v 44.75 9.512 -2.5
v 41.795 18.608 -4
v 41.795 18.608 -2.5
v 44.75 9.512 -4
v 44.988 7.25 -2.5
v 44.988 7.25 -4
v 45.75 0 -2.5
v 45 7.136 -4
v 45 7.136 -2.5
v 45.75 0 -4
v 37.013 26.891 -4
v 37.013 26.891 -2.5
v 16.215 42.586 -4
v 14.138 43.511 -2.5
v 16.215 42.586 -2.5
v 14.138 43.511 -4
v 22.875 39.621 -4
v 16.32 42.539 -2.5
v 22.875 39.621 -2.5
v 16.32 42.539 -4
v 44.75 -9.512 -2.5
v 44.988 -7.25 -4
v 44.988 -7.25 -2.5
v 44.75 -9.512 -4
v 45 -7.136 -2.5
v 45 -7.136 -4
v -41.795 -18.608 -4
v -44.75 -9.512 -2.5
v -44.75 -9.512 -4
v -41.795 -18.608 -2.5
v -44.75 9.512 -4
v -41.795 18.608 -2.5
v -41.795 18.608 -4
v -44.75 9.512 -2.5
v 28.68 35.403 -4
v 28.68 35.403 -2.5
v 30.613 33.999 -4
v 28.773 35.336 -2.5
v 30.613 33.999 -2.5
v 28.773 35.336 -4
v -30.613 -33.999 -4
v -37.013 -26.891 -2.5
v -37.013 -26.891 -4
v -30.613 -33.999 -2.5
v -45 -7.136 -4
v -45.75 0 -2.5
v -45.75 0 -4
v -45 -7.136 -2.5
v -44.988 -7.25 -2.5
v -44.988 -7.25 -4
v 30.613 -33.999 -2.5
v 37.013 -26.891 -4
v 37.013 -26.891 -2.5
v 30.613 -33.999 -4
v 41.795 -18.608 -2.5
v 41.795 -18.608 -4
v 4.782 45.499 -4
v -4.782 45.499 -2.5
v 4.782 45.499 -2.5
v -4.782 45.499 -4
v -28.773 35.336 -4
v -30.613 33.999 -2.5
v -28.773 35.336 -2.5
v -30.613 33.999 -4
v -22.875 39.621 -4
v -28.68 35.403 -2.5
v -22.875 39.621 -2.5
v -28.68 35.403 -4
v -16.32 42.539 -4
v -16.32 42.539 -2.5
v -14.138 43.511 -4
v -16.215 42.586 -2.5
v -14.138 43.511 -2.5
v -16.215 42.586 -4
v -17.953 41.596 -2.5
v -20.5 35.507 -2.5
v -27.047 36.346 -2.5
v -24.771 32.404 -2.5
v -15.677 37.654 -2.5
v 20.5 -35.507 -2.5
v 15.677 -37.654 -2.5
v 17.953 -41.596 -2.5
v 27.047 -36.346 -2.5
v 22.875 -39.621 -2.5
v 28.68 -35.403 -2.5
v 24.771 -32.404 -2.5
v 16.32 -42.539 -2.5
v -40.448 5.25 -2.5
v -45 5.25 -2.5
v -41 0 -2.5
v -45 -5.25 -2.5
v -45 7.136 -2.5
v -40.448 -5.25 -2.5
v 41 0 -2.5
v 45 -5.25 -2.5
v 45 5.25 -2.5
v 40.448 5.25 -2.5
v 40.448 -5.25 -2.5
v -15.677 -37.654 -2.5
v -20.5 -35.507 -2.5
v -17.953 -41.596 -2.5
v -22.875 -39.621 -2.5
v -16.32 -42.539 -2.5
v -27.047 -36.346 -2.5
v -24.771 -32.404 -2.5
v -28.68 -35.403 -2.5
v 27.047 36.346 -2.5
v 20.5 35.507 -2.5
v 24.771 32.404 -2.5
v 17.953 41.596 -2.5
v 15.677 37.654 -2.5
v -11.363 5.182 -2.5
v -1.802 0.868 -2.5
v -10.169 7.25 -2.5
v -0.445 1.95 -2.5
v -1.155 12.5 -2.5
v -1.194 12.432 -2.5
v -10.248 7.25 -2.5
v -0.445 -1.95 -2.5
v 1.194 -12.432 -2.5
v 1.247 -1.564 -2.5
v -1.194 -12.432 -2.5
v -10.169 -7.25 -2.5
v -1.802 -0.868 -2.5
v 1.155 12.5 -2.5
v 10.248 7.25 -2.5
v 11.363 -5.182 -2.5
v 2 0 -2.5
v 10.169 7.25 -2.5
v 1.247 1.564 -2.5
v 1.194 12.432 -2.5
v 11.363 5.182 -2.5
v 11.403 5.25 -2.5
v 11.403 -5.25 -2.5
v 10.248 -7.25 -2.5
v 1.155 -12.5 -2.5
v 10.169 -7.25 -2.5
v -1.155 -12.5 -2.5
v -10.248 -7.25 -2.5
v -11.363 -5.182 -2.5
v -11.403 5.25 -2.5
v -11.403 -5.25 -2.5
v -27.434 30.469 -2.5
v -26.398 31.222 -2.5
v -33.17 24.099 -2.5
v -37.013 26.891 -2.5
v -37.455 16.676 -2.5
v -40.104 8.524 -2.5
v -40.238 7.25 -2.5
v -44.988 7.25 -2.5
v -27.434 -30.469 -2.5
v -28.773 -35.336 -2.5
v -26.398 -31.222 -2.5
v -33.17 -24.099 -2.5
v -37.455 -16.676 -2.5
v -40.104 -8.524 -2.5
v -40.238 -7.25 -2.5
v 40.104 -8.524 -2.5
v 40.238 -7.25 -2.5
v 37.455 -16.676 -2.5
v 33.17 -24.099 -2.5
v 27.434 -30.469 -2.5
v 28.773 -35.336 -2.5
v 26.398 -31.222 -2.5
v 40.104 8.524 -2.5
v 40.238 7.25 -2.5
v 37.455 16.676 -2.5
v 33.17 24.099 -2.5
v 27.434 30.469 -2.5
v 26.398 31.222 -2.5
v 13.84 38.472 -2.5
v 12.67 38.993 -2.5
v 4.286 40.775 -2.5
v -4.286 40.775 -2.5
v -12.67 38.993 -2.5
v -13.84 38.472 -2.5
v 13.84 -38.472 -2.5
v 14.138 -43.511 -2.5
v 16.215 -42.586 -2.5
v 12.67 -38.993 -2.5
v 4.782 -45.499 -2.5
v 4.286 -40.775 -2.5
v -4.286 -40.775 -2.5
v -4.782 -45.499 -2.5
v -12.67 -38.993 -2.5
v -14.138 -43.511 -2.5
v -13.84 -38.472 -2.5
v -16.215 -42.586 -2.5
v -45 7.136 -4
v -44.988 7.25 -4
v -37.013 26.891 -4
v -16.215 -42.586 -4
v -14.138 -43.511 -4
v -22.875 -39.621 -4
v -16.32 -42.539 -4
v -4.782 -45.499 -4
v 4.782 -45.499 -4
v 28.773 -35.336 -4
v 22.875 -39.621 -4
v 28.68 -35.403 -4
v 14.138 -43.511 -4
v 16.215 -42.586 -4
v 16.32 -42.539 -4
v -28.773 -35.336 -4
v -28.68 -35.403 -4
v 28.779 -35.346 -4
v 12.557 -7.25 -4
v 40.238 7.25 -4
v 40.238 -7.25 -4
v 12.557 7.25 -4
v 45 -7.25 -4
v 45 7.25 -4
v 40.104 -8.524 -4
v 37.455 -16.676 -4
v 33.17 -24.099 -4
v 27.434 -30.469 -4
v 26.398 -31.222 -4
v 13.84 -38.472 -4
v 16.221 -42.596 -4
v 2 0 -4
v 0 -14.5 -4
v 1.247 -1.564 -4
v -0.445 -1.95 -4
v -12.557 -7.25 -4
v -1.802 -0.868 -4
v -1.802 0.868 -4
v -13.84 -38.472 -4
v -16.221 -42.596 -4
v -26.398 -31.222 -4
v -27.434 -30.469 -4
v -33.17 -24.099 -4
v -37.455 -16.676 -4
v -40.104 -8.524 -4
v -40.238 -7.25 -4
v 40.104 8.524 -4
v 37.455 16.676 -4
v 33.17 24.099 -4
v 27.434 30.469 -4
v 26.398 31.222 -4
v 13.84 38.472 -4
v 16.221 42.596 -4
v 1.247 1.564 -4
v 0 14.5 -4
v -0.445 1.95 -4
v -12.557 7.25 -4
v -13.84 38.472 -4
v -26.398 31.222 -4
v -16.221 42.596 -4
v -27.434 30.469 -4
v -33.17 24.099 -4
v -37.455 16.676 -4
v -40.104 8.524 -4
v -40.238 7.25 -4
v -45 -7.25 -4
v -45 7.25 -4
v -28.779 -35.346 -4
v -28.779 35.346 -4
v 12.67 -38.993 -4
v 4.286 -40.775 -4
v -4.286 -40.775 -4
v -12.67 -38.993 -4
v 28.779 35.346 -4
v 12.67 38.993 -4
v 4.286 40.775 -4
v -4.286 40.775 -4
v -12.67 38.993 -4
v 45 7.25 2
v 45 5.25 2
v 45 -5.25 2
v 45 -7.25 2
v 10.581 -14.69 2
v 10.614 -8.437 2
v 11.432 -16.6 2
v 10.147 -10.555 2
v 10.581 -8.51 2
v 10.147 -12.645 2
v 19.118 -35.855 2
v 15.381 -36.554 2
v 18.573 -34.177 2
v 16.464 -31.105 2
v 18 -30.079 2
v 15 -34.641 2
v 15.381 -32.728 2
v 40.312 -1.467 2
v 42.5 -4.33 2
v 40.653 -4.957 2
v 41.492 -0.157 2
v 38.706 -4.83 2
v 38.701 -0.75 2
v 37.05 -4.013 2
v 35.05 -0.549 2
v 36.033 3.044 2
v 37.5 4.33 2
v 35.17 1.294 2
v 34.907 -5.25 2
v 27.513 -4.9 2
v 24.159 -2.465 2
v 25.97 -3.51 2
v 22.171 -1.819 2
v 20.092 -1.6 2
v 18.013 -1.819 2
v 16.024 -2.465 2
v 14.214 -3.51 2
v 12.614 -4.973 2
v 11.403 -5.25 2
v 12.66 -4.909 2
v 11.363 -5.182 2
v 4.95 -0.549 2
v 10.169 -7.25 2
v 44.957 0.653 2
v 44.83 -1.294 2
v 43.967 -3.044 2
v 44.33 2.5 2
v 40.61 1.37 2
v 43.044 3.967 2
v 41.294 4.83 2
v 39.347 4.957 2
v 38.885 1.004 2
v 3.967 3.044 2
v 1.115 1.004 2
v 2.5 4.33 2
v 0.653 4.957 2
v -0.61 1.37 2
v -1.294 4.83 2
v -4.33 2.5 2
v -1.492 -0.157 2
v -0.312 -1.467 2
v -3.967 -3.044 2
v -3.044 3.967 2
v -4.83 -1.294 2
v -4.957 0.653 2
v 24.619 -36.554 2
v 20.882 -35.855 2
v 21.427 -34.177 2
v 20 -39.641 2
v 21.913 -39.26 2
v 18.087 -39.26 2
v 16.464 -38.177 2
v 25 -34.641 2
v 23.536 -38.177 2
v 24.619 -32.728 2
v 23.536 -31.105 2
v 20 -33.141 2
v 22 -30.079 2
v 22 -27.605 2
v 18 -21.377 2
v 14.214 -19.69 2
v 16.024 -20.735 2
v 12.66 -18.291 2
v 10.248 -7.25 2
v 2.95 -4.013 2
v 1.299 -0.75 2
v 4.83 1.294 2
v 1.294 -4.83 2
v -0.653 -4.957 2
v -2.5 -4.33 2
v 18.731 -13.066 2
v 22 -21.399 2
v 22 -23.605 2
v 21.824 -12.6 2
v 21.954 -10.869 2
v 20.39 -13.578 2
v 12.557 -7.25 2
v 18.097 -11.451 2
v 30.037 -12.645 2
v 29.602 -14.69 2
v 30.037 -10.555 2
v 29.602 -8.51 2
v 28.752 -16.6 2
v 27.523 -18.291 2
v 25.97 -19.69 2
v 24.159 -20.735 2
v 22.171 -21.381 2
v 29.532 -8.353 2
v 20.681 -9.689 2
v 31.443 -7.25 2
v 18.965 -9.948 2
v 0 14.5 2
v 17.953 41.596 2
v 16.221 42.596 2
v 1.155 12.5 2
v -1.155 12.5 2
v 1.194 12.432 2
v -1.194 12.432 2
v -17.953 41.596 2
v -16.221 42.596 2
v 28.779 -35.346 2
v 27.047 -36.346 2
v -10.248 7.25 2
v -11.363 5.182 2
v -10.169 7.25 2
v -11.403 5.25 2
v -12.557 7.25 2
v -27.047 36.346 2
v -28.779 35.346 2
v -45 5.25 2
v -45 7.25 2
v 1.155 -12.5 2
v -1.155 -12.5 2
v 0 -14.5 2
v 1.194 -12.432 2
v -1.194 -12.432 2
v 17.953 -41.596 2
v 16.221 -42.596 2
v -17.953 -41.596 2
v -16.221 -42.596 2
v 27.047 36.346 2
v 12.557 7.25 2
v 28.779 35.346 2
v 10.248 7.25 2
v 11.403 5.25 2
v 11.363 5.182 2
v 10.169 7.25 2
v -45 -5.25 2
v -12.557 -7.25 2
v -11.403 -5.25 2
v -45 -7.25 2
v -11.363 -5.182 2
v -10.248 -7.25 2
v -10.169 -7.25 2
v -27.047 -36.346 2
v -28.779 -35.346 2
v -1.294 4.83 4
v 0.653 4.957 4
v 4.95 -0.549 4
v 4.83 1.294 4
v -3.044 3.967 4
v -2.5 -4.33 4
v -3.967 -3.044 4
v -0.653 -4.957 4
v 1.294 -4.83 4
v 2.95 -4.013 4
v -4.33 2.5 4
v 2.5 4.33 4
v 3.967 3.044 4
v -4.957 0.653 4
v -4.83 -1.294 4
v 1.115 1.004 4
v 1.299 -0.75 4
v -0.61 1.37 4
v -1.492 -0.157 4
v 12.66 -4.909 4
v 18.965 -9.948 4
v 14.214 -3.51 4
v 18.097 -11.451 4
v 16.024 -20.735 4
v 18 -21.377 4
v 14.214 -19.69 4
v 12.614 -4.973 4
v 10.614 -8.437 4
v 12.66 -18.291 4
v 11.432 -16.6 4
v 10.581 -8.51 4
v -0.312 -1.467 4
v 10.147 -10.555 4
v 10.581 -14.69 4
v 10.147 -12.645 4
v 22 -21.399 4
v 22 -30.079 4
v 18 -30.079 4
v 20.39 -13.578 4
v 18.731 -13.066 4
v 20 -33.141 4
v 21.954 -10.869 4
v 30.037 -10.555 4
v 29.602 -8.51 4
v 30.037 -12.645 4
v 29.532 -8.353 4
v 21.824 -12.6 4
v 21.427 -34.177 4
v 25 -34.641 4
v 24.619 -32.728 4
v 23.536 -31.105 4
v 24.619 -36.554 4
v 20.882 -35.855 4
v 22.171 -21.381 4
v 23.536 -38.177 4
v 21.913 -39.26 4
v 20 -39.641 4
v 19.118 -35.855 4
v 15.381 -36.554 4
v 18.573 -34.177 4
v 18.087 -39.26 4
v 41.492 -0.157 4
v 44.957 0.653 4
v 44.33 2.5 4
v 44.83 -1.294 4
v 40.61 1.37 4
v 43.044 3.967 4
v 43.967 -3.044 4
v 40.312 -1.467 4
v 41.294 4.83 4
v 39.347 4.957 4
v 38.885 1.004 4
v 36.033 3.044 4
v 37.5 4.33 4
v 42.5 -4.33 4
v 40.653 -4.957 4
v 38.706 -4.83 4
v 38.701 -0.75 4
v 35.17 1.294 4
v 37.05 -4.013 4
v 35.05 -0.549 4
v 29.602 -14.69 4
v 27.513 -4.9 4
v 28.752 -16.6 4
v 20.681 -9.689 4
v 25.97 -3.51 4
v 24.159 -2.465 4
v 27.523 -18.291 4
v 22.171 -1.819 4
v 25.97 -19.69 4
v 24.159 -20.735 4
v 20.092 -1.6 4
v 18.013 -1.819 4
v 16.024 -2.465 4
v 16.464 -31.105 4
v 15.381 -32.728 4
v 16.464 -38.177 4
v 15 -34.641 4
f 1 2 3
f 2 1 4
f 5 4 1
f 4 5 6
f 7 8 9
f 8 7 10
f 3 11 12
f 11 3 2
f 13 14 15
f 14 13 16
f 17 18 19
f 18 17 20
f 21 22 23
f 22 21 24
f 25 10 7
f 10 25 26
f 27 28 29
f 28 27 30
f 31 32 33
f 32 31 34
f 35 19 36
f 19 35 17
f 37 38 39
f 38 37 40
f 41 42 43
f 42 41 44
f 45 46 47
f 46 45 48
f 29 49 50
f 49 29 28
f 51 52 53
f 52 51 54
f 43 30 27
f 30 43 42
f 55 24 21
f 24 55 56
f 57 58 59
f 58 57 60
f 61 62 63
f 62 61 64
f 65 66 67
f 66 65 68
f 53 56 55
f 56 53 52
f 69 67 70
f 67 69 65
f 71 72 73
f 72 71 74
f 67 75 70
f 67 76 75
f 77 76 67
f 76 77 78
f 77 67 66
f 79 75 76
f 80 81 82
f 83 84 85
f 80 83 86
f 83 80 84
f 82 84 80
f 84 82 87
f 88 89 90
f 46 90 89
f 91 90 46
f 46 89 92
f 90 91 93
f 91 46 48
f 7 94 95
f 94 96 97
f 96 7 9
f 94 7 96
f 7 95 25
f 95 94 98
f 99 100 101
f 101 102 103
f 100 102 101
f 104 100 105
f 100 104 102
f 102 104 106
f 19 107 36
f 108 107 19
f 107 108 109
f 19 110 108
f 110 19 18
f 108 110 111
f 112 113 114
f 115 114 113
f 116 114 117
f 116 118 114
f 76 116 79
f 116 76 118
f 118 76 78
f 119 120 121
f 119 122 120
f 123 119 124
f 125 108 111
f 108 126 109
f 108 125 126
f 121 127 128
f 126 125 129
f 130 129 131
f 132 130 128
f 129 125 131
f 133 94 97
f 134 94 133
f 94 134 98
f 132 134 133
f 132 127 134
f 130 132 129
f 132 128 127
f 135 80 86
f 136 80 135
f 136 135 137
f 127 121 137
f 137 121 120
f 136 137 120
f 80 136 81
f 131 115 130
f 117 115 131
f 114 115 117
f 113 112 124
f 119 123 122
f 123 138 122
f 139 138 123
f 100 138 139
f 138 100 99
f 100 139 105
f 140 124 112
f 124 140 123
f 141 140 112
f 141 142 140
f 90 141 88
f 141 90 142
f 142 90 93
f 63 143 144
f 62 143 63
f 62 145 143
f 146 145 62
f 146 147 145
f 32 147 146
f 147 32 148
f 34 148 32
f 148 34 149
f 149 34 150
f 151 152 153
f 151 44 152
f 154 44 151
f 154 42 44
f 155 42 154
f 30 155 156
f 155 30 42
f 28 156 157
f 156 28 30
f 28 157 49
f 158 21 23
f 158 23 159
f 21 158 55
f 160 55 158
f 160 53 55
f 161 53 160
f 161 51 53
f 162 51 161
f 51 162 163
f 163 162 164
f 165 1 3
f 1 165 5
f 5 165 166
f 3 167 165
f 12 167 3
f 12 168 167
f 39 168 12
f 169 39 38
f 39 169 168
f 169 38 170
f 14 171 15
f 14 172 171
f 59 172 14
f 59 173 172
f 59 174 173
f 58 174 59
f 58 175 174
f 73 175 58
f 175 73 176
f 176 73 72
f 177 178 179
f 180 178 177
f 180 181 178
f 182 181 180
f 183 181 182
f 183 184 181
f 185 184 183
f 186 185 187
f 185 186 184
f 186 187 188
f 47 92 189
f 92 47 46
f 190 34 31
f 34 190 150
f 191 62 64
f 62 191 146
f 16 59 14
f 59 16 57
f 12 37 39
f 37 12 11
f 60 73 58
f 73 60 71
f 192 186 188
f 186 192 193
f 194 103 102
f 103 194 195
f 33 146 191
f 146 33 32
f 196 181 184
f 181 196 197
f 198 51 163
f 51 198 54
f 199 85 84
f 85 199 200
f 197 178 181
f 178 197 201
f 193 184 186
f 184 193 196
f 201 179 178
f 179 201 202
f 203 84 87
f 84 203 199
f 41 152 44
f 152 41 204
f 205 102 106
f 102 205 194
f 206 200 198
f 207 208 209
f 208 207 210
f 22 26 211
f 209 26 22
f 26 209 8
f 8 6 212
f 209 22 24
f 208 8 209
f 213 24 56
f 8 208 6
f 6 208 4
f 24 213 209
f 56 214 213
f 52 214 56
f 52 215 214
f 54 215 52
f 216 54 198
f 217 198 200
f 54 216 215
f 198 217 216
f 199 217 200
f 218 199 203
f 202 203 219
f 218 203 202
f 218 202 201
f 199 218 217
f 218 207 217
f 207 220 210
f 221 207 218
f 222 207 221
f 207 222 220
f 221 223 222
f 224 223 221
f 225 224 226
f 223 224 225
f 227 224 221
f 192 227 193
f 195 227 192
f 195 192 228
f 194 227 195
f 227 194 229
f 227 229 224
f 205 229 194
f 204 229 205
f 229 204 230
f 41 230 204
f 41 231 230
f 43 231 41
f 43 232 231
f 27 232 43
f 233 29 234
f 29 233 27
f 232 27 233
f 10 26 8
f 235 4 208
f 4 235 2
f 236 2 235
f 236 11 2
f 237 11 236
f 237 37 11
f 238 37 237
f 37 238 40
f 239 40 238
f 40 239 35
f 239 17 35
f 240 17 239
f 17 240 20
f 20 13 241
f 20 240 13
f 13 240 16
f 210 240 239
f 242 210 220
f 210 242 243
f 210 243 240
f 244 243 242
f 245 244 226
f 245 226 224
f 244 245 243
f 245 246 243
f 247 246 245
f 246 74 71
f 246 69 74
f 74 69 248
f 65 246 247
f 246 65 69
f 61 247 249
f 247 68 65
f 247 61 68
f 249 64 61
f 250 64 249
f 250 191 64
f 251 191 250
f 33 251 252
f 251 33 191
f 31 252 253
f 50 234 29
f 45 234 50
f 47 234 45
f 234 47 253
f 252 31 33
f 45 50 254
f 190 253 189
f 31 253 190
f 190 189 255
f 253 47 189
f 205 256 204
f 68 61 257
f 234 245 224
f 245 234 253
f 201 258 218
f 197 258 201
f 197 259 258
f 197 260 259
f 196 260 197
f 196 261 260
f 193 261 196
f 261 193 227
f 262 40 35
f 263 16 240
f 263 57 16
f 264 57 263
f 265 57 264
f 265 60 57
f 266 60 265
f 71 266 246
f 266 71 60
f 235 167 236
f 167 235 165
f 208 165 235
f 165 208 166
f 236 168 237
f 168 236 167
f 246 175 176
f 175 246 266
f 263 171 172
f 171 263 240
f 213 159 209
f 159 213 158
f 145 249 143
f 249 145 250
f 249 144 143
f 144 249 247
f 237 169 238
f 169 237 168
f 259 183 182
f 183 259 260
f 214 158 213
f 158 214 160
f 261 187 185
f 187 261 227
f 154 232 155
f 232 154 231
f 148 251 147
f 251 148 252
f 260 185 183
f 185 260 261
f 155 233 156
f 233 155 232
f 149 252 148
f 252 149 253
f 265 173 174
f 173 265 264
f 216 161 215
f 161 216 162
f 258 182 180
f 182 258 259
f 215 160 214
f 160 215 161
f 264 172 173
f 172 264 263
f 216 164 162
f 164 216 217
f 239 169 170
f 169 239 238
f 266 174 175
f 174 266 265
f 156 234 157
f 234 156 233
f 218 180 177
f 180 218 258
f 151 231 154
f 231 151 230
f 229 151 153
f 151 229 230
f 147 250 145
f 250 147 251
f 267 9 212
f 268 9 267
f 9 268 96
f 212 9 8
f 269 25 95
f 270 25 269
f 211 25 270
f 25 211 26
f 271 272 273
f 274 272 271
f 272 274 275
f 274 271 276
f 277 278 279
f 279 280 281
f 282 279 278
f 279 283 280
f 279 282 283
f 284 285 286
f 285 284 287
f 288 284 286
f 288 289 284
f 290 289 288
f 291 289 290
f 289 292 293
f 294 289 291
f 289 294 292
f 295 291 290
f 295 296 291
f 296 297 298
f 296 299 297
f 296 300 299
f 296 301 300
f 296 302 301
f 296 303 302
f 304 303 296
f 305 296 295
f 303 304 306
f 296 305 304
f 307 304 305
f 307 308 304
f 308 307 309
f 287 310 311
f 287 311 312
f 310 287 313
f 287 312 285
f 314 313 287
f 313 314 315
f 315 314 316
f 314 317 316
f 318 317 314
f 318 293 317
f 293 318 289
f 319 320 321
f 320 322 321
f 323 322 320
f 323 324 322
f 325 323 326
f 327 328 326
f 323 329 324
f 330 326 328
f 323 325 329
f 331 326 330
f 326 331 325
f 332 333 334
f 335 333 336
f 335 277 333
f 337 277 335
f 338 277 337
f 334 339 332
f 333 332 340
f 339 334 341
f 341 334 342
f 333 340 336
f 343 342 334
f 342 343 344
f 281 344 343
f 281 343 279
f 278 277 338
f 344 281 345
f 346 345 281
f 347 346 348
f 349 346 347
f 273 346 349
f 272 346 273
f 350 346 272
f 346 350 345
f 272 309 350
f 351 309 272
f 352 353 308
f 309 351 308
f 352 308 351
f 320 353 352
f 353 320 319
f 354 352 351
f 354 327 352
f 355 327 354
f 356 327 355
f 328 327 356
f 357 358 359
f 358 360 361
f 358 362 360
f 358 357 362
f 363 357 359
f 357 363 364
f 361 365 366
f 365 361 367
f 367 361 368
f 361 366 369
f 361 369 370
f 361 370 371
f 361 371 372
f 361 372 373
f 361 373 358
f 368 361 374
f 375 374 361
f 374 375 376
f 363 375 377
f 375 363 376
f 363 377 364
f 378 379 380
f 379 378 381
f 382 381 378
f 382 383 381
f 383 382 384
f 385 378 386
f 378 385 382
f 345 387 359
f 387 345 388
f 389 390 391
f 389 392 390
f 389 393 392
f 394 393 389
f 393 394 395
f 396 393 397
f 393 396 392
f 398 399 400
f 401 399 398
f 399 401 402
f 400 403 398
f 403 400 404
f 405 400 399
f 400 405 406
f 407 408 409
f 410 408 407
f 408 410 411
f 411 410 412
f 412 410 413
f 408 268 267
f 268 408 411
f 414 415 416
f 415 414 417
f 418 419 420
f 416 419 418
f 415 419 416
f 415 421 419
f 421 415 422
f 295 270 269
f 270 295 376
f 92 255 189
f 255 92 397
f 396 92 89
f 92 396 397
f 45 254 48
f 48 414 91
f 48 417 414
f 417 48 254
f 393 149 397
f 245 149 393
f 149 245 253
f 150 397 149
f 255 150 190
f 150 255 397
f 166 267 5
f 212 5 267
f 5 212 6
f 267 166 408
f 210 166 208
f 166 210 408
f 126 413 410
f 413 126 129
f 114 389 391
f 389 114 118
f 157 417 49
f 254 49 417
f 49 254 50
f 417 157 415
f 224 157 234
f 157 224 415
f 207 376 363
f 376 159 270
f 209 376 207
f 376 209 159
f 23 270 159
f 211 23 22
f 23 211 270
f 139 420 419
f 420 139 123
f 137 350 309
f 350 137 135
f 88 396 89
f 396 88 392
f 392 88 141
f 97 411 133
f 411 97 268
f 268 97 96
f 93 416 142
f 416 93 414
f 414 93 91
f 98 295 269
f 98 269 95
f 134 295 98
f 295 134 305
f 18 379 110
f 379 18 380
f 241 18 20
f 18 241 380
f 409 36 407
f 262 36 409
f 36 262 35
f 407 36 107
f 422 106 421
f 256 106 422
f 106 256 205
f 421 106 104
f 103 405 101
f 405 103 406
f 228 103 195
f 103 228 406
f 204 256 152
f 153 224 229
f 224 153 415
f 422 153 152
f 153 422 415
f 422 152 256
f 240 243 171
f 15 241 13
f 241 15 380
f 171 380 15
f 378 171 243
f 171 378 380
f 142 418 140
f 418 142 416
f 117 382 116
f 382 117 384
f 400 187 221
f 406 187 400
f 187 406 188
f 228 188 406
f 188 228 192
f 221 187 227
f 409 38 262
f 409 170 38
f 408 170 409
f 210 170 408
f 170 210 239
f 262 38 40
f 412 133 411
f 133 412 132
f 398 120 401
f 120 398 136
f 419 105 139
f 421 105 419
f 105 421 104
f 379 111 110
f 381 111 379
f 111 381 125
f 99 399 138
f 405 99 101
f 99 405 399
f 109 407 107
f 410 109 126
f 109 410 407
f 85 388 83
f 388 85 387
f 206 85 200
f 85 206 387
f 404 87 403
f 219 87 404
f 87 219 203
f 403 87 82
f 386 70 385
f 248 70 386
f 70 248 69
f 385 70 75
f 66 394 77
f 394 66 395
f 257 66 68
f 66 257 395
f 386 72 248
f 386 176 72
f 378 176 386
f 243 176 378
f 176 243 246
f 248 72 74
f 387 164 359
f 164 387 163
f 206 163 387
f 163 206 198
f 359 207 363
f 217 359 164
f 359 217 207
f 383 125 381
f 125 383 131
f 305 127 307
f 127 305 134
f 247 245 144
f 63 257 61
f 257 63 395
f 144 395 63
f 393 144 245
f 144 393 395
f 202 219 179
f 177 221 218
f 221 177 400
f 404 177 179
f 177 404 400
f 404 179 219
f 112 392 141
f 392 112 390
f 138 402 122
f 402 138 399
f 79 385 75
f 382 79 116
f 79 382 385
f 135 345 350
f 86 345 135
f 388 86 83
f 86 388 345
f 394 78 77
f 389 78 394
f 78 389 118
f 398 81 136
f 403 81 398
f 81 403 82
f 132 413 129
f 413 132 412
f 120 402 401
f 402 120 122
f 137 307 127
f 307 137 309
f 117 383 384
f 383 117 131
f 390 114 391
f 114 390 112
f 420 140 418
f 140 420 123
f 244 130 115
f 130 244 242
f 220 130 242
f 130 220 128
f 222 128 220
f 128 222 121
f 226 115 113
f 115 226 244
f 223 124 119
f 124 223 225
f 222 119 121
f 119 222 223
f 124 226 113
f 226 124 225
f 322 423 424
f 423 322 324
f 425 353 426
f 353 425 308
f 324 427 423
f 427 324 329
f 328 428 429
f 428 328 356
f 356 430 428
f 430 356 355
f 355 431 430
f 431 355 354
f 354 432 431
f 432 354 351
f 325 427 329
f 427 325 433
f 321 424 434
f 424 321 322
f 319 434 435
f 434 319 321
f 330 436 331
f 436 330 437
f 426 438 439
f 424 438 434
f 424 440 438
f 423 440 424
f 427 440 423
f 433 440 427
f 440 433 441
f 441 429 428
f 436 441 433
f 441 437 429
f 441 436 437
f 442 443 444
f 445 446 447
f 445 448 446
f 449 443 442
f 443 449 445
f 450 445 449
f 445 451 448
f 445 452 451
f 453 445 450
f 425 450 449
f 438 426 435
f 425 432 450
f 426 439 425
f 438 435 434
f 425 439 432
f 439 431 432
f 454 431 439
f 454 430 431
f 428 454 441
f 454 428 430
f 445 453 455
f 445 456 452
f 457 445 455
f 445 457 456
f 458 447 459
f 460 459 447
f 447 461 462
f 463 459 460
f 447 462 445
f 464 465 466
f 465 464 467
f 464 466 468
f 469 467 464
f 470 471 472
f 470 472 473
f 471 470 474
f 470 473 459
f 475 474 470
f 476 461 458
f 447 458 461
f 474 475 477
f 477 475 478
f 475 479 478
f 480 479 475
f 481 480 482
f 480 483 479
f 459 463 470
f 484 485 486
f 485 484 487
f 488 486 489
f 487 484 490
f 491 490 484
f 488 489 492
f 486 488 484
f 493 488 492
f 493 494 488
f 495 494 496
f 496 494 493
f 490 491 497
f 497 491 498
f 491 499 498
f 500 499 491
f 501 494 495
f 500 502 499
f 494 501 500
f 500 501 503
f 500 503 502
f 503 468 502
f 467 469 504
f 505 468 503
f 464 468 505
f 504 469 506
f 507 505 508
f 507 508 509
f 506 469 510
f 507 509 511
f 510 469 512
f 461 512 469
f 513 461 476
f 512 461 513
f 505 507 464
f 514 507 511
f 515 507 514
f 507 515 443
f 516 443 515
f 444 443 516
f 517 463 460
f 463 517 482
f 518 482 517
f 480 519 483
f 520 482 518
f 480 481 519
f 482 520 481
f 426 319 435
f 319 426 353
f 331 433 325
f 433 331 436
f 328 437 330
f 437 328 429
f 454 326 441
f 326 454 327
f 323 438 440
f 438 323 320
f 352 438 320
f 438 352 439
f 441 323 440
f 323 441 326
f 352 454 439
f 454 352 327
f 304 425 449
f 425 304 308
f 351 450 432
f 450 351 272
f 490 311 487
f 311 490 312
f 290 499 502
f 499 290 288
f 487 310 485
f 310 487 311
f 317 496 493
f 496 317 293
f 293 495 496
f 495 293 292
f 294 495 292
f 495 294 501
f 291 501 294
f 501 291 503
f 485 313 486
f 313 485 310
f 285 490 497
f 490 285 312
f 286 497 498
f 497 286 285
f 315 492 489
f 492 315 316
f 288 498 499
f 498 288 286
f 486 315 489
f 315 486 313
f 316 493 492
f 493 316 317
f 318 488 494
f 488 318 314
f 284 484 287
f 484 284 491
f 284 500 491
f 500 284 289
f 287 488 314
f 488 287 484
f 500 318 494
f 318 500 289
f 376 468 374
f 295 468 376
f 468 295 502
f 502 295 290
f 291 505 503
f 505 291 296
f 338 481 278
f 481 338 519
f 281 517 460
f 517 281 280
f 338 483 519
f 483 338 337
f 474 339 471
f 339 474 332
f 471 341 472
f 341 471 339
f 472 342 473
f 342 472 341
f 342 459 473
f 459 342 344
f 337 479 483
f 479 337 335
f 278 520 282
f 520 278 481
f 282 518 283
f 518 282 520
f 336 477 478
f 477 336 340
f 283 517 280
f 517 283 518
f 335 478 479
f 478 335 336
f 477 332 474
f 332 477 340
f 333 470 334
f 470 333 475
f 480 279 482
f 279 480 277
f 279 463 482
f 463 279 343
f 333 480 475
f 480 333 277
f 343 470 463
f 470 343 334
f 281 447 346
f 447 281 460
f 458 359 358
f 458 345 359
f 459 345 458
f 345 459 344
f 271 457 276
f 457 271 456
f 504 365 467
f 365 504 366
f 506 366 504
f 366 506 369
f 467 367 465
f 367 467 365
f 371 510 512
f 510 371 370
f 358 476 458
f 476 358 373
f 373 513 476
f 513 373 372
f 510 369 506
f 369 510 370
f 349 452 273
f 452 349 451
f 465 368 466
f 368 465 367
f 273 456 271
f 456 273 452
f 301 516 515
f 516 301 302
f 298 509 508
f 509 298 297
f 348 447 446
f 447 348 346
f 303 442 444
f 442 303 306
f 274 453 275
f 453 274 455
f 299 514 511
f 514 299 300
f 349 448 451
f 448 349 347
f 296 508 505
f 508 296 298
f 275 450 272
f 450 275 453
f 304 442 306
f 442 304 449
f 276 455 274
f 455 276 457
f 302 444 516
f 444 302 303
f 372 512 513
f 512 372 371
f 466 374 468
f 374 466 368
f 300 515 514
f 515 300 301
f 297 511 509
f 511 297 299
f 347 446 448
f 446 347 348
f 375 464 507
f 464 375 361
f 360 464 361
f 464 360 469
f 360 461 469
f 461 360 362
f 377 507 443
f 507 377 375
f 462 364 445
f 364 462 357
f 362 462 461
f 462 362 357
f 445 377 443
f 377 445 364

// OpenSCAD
/* 
* Parameters
*/
bearing_diameter = 10;
bearing_bore_diameter = 3;
bearing_height = 4;
wheel_diameter = 90;
wheel_bore_diameter = 3;
wheel_height = 10;
frame_thickness = 2;


/* 
* Assembly / Printing
*/
wheel();
small_wheel();
// for print use rotate
//translate([0, 0, 54]) rotate([0, 90, 0]) rotate([0, 0, 30])
//frame();


/* 
* Modules
*/
module frame(){
	a = wheel_diameter/2 + 15;
	b = wheel_diameter/4 + 20;

	translate([0,0,-6]){
		difference(){
			union(){
				cylinder(r=wheel_bore_diameter*2, h=frame_thickness, center=true);
				rotate([0,0,-75])
				linear_extrude(height=frame_thickness, center=true)
					polygon(points=[[-6,0],[0,-6],[a,15],[15,a]]);
			}
			cylinder(r=wheel_bore_diameter/2, h=frame_thickness, center=true);
		}
	}


	rotate([0, 0, -30])
	translate([(wheel_diameter/2)/2 + 0.7 ,0 , 5.5]){
		difference(){
			union(){
				cylinder(r=wheel_bore_diameter*2, h=frame_thickness, center=true);
				rotate([0,0,-45])
				linear_extrude(height=frame_thickness, center=true)
					polygon(points=[[-6,0],[0,-6],[b,0],[0,b]]);
			}
			cylinder(r=wheel_bore_diameter/2, h=frame_thickness, center=true);
		}
	}

	#rotate([0, 0, -30])
	translate([a - 7 ,0 , 3]){

		cube(size=[frame_thickness, 64, 20], center=true);
	}
	
}


module small_wheel(){

	bearings();

	rotate([0, 0, -30]) 
		small_wheel_arm();
	
	translate([wheel_diameter/2 - bearing_diameter/2,0,0])
	rotate([0, 0, -150]) 
	small_wheel_arm();

	rotate([0, 0, -60])
	translate([wheel_diameter/2 - bearing_diameter/2,0,0])
	rotate([0, 0, 150]) 
	small_wheel_arm();

	rotate([0, 0, -30])
	translate([(wheel_diameter/2)/2 + 0.7 ,0,3])	
		difference(){
			cylinder(r=10, h=2, center=true);
			cylinder(r=2, h=5, center=true);
		}
	

	module small_wheel_arm(){
		translate([0,0,3]){
			difference(){
				cylinder(r=bearing_diameter/2, h=2, center=true);
				cylinder(r=bearing_bore_diameter/2, h=2, center=true);
			}

			translate([wheel_diameter/8,0,0])
				cube(size=[wheel_diameter/4 - 6 , 4, 2], center=true);

		}		
	}

	module bearings(){
		%bearing();

		%translate([wheel_diameter/2 - bearing_diameter/2, 0, 0])
			bearing();

		%rotate([0, 0, -60])
		translate([wheel_diameter/2 - bearing_diameter/2, 0, 0])
			bearing();
	}
	
	module bearing(){
		difference(){
			cylinder(r=bearing_diameter/2, h=bearing_height, center=true);
			cylinder(r=bearing_bore_diameter/2, h=bearing_height+1, center=true);
		}
	}
}


module wheel(){
	difference(){
		union(){
			translate([0, 0, -3.25]) {
				difference(){
					cylinder(r=wheel_diameter/2 + 0.75, h=1.5, center=true);
					cylinder(r=wheel_diameter/2 - 4, h=2, center=true);
				}
			}
				

			grooves();	
		}
		cylinder(r=2, h=10, center=true);
	}

	module grooves(){
		difference(){

			union(){
				groove();

				rotate([0, 0, 60])
					groove();

				rotate([0, 0, -60])
					groove();
			}

			translate([0, 0, 2.5])
			cylinder(r=12.5, h=10, center=true);
		}
	}	

	module groove(){
		difference() {
			translate([0, 0, -1])
			cube(size=[wheel_diameter, bearing_diameter+4+0.5, bearing_height+2], center=true);

			cube(size=[wheel_diameter+10, bearing_diameter+0.5, bearing_height+1], center=true);
		}
		
	}
}
